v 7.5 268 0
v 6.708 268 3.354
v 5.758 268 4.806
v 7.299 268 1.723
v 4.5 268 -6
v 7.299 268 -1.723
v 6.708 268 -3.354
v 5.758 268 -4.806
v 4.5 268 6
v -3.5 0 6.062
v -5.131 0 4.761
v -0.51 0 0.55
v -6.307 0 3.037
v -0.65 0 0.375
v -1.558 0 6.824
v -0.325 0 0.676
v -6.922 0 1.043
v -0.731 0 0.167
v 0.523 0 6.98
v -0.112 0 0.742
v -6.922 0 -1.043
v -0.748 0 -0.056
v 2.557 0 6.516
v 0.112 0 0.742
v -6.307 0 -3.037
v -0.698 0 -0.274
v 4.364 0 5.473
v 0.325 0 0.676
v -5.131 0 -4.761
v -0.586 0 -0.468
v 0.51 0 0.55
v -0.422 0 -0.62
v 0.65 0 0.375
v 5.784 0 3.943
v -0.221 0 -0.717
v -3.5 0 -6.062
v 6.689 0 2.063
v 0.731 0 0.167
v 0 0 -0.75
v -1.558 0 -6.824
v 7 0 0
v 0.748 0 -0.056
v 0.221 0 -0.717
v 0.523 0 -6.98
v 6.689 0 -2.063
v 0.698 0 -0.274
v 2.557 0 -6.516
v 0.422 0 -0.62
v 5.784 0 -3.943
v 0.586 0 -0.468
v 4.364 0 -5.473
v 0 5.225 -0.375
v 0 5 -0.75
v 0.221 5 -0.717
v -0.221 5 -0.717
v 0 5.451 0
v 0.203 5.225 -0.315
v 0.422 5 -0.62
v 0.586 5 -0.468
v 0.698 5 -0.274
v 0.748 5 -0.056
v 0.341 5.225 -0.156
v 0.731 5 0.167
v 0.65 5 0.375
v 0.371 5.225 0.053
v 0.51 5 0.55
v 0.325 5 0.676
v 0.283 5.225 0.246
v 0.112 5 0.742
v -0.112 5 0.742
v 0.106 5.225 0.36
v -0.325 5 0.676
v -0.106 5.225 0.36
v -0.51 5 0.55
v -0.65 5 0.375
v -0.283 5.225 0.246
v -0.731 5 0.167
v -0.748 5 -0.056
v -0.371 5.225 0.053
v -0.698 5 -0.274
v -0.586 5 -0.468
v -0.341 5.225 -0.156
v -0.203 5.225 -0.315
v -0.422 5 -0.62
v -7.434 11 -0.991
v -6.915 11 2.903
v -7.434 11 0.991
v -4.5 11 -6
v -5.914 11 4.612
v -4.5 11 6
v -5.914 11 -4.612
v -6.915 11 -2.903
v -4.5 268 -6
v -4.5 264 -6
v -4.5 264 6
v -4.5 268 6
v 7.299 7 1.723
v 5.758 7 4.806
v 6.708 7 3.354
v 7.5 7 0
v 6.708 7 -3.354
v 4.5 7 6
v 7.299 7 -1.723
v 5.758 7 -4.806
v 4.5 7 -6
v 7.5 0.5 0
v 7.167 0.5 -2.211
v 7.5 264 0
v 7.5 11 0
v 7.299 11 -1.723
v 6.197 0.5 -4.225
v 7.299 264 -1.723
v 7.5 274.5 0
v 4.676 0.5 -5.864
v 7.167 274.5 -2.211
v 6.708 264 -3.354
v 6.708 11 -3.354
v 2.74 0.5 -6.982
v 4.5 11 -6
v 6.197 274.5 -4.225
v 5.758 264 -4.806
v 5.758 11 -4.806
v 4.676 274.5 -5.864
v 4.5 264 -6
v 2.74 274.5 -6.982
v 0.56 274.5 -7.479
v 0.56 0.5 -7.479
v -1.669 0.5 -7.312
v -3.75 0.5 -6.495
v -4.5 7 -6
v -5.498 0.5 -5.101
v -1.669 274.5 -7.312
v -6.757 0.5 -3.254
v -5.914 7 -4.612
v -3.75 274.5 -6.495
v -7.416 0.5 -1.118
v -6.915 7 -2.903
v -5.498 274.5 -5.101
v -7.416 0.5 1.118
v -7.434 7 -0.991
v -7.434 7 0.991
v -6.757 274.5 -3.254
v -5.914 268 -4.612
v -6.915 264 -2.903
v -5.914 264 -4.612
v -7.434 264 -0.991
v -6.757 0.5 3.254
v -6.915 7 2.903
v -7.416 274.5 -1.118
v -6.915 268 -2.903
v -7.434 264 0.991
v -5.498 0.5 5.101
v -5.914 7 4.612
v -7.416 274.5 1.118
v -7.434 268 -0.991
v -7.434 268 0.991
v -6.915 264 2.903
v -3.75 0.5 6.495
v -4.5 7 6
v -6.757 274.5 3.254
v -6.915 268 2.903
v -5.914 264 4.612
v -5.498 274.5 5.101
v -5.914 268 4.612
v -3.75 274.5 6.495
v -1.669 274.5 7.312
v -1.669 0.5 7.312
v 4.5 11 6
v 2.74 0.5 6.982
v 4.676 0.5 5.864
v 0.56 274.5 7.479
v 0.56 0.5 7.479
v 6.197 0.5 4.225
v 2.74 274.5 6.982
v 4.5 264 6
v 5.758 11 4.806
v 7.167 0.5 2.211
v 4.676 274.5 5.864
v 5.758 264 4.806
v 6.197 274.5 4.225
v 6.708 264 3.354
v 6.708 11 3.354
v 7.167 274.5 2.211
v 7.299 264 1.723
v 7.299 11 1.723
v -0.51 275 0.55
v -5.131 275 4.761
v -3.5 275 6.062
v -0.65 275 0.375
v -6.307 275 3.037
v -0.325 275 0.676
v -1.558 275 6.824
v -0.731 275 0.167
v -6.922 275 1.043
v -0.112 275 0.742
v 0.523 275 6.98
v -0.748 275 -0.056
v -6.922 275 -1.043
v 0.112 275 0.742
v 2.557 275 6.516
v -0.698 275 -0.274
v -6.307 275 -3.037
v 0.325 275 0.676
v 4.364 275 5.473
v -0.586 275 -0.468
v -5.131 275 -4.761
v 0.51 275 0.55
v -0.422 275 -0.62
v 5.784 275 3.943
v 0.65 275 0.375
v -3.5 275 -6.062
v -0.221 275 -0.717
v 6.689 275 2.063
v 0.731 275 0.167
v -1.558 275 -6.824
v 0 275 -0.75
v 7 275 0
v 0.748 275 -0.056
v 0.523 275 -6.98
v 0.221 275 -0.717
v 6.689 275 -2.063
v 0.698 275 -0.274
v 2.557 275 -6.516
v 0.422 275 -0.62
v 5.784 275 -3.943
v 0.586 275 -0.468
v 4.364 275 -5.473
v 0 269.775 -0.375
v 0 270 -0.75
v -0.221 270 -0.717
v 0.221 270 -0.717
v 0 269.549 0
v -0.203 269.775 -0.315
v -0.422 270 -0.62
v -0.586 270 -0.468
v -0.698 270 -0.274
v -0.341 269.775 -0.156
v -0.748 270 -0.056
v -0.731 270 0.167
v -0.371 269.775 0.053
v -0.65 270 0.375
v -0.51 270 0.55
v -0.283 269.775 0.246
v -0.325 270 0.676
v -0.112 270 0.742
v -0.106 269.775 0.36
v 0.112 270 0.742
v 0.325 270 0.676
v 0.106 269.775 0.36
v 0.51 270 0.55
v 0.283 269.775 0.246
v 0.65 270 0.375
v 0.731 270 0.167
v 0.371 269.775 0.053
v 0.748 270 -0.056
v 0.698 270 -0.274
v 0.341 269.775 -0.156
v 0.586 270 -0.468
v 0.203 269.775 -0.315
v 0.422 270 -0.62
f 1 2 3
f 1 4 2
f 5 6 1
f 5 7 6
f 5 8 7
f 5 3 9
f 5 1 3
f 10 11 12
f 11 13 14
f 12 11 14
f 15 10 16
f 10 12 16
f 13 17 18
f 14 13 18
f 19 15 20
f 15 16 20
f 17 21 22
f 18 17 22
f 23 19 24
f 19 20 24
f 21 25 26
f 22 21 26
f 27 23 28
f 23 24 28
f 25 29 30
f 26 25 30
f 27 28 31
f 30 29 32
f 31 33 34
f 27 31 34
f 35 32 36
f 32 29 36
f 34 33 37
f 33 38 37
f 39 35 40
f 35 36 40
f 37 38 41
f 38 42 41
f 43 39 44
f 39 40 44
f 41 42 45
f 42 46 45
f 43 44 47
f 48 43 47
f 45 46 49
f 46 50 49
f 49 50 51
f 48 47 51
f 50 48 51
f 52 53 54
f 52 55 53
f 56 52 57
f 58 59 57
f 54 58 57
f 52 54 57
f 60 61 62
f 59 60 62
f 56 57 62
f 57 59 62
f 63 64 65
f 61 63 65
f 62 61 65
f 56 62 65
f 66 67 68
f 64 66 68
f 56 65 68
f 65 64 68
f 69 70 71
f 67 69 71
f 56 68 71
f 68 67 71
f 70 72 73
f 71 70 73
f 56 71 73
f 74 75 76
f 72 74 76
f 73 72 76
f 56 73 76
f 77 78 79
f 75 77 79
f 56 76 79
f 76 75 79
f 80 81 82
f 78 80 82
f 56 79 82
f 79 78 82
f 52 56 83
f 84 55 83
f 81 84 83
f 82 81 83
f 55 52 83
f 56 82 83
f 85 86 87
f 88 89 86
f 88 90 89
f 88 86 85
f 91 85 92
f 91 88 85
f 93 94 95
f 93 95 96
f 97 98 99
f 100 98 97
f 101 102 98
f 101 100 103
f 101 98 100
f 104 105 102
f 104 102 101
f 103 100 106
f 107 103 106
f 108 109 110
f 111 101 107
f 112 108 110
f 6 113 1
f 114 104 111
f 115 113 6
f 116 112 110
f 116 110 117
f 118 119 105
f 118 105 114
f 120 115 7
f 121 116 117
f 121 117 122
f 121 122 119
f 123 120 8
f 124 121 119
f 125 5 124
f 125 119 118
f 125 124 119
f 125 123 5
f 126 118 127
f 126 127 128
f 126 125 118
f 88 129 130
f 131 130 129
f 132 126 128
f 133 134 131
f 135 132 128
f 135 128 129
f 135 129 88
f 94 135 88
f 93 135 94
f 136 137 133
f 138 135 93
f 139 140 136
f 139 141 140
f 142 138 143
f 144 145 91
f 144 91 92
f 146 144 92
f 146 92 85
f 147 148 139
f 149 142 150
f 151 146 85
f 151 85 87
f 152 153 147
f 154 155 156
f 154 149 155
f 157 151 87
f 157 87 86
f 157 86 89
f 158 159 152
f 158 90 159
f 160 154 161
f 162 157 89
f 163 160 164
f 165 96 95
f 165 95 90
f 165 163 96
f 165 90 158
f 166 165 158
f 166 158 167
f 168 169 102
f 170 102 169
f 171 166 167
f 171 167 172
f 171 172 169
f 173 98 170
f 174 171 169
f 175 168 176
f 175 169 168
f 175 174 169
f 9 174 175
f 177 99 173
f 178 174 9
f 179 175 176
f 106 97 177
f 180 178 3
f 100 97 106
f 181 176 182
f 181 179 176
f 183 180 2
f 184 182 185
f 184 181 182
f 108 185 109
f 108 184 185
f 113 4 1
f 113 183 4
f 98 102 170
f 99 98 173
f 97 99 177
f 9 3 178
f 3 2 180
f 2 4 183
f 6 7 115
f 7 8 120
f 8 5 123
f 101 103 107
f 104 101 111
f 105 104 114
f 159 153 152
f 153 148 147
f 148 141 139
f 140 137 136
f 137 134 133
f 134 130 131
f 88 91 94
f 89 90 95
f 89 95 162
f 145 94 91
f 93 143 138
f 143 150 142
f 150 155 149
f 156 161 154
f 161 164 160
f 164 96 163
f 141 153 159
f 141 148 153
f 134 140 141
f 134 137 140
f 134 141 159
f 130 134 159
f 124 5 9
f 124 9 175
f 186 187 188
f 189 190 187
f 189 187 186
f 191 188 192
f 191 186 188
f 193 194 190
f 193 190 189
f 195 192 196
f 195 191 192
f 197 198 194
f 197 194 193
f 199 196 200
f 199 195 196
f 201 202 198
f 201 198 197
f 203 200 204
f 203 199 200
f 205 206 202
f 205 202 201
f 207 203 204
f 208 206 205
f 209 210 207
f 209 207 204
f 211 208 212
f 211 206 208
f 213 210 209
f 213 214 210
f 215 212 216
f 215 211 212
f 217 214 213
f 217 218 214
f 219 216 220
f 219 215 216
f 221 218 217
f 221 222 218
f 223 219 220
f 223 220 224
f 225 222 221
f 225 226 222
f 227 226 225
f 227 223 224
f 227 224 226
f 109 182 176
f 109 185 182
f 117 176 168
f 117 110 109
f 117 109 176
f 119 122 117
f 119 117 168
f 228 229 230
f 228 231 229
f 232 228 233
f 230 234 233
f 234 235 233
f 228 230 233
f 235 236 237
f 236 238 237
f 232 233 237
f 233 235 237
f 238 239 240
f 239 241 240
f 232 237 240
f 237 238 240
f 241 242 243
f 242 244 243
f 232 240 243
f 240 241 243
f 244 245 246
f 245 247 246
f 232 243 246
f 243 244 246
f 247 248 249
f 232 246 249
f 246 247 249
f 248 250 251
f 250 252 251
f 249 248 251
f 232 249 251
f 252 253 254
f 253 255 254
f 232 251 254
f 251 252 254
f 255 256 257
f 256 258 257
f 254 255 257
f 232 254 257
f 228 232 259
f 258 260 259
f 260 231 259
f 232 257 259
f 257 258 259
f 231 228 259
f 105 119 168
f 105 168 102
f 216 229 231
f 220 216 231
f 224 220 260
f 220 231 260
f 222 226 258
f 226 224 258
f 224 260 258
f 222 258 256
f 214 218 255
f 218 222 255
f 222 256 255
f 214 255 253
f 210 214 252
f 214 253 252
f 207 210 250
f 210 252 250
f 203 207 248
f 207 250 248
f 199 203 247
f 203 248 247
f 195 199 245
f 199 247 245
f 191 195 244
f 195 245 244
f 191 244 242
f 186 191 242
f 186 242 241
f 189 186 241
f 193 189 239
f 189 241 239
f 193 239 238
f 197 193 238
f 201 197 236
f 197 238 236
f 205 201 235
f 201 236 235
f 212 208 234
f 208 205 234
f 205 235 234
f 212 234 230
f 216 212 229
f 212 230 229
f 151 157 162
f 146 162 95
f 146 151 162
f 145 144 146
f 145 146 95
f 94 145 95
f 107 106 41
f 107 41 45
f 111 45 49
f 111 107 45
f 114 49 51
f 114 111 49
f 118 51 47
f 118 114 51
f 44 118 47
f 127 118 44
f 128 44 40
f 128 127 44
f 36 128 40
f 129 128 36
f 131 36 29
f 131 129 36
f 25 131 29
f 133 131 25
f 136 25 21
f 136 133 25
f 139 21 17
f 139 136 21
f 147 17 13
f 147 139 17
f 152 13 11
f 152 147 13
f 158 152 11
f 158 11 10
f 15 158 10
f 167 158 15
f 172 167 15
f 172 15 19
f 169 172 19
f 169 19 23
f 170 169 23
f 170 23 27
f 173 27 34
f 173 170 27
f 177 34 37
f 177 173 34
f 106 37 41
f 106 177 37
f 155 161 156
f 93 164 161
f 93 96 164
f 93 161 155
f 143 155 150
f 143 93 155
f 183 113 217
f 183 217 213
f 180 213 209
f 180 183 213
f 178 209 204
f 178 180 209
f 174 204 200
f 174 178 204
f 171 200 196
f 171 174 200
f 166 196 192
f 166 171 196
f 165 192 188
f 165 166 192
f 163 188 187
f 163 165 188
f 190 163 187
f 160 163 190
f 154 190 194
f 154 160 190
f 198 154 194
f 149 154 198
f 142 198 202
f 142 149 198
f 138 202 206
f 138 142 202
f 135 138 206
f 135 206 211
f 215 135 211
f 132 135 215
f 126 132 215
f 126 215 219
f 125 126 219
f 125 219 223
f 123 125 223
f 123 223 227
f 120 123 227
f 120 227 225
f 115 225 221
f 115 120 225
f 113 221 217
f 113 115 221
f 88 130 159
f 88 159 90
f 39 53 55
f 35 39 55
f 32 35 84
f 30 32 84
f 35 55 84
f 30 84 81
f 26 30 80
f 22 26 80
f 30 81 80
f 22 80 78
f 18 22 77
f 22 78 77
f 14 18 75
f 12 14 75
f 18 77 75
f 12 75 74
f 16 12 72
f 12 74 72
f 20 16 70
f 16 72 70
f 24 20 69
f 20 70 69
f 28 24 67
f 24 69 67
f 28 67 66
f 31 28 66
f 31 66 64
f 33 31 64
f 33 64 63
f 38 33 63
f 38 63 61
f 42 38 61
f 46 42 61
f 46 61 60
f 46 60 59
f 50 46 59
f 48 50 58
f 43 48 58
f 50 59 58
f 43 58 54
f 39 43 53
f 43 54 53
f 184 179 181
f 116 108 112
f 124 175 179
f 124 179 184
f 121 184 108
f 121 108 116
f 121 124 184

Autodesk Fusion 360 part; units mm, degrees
sketch "Sketch1" plane through (0, 0, 0) normal (0, 0, 1) x (1, 0, 0)
  line L0 (-7.5, 0) -> (7.5, 0)
  line L1 (7.5, 0) -> (7.5, 275)
  line L2 (7.5, 275) -> (-7.5, 275)
  line L3 (-7.5, 275) -> (-7.5, 0)
  line L4 (-7.5, 7) -> (-4.5, 7)
  line L5 (-4.5, 7) -> (-4.5, 11)
  line L6 (-4.5, 11) -> (-7.5, 11)
  line L7 (0, 0) -> (0, 275)
  dimension "d1" = 15
  dimension "d2" = 275
  dimension "d3" = 7
  dimension "d4" = 4
  dimension "d5" = 3
revolve "Revolve1" add sketch "Sketch1" angle 360 about axis through (0, 0, 0) along (0, 1, 0) contours L0 L1 L2 L7
extrude "Extrude1" cut sketch "Sketch1" along normal through all and the other way through all contours L3 L4 L5 L6
mirror "Mirror1" about plane through (0, 0, 0) normal (1, 0, 0) of "Extrude1"
ref_plane "WorkPlane1" through (0, 137.5, 0) normal (0, -1, 0) x (0, 0, -1)
hole "Hole2" at (0, 0, 0) direction (0, 1, 0) diameter 1.5 depth 5 tip angle 118
mirror "Mirror2" about plane through (0, 137.5, 0) normal (0, -1, 0) of "Mirror1", "Extrude1", "Hole2"
chamfer "Chamfer1" distance 0.5 angle 45 2 edges at (-6.9925, 0, -2.7121) (-6.9925, 275, -2.7121)
